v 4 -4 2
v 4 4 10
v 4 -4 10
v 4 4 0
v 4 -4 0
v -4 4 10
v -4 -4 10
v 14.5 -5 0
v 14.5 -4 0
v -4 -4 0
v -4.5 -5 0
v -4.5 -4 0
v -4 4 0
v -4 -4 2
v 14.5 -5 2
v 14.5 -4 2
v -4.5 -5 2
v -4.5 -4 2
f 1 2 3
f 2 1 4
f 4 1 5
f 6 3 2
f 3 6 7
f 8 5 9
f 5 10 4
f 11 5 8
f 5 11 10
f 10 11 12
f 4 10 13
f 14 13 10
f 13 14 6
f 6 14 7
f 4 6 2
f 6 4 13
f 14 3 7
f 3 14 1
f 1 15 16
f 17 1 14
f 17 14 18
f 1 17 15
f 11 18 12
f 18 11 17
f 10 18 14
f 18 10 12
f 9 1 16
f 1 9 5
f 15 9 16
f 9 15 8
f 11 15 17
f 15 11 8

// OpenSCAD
translate([0, 0, 5]) color([0,1,0,0.9]) cube([8, 8, 10], center=true);
translate([-4.25, -4.25, 1]) color([1,0,0]) cube([0.5, 0.5, 2], center=true);
translate([-3.75, -4.25, 1]) color([1,0,0]) cube([0.5, 0.5, 2], center=true);
translate([-3.25, -4.25, 1]) color([1,0,0]) cube([0.5, 0.5, 2], center=true);
translate([-2.75, -4.25, 1]) color([1,0,0]) cube([0.5, 0.5, 2], center=true);
translate([-2.25, -4.25, 1]) color([1,0,0]) cube([0.5, 0.5, 2], center=true);
translate([-1.75, -4.25, 1]) color([1,0,0]) cube([0.5, 0.5, 2], center=true);
translate([-1.25, -4.25, 1]) color([1,0,0]) cube([0.5, 0.5, 2], center=true);
translate([-0.75, -4.25, 1]) color([1,0,0]) cube([0.5, 0.5, 2], center=true);
translate([-0.25, -4.25, 1]) color([1,0,0]) cube([0.5, 0.5, 2], center=true);
translate([0.25, -4.25, 1]) color([1,0,0]) cube([0.5, 0.5, 2], center=true);
translate([0.75, -4.25, 1]) color([1,0,0]) cube([0.5, 0.5, 2], center=true);
translate([1.25, -4.25, 1]) color([1,0,0]) cube([0.5, 0.5, 2], center=true);
translate([1.75, -4.25, 1]) color([1,0,0]) cube([0.5, 0.5, 2], center=true);
translate([2.25, -4.25, 1]) color([1,0,0]) cube([0.5, 0.5, 2], center=true);
translate([2.75, -4.25, 1]) color([1,0,0]) cube([0.5, 0.5, 2], center=true);
translate([3.25, -4.25, 1]) color([1,0,0]) cube([0.5, 0.5, 2], center=true);
translate([3.75, -4.25, 1]) color([1,0,0]) cube([0.5, 0.5, 2], center=true);
translate([4.25, -4.25, 1]) color([1,0,0]) cube([0.5, 0.5, 2], center=true);
translate([4.75, -4.25, 1]) color([1,0,0]) cube([0.5, 0.5, 2], center=true);
translate([5.25, -4.25, 1]) color([1,0,0]) cube([0.5, 0.5, 2], center=true);
translate([5.75, -4.25, 1]) color([1,0,0]) cube([0.5, 0.5, 2], center=true);
translate([6.25, -4.25, 1]) color([1,0,0]) cube([0.5, 0.5, 2], center=true);
translate([6.75, -4.25, 1]) color([1,0,0]) cube([0.5, 0.5, 2], center=true);
translate([7.25, -4.25, 1]) color([1,0,0]) cube([0.5, 0.5, 2], center=true);
translate([7.75, -4.25, 1]) color([1,0,0]) cube([0.5, 0.5, 2], center=true);
translate([8.25, -4.25, 1]) color([1,0,0]) cube([0.5, 0.5, 2], center=true);
translate([8.75, -4.25, 1]) color([1,0,0]) cube([0.5, 0.5, 2], center=true);
translate([9.25, -4.25, 1]) color([1,0,0]) cube([0.5, 0.5, 2], center=true);
translate([9.75, -4.25, 1]) color([1,0,0]) cube([0.5, 0.5, 2], center=true);
translate([10.25, -4.25, 1]) color([1,0,0]) cube([0.5, 0.5, 2], center=true);
translate([10.75, -4.25, 1]) color([1,0,0]) cube([0.5, 0.5, 2], center=true);
translate([11.25, -4.25, 1]) color([1,0,0]) cube([0.5, 0.5, 2], center=true);
translate([11.75, -4.25, 1]) color([1,0,0]) cube([0.5, 0.5, 2], center=true);
translate([12.25, -4.25, 1]) color([1,0,0]) cube([0.5, 0.5, 2], center=true);
translate([12.75, -4.25, 1]) color([1,0,0]) cube([0.5, 0.5, 2], center=true);
translate([13.25, -4.25, 1]) color([1,0,0]) cube([0.5, 0.5, 2], center=true);
translate([13.75, -4.25, 1]) color([1,0,0]) cube([0.5, 0.5, 2], center=true);
translate([14.25, -4.25, 1]) color([1,0,0]) cube([0.5, 0.5, 2], center=true);
translate([-4.25, -4.75, 1]) color([1,0,0]) cube([0.5, 0.5, 2], center=true);
translate([-3.75, -4.75, 1]) color([1,0,0]) cube([0.5, 0.5, 2], center=true);
translate([-3.25, -4.75, 1]) color([1,0,0]) cube([0.5, 0.5, 2], center=true);
translate([-2.75, -4.75, 1]) color([1,0,0]) cube([0.5, 0.5, 2], center=true);
translate([-2.25, -4.75, 1]) color([1,0,0]) cube([0.5, 0.5, 2], center=true);
translate([-1.75, -4.75, 1]) color([1,0,0]) cube([0.5, 0.5, 2], center=true);
translate([-1.25, -4.75, 1]) color([1,0,0]) cube([0.5, 0.5, 2], center=true);
translate([-0.75, -4.75, 1]) color([1,0,0]) cube([0.5, 0.5, 2], center=true);
translate([-0.25, -4.75, 1]) color([1,0,0]) cube([0.5, 0.5, 2], center=true);
translate([0.25, -4.75, 1]) color([1,0,0]) cube([0.5, 0.5, 2], center=true);
translate([0.75, -4.75, 1]) color([1,0,0]) cube([0.5, 0.5, 2], center=true);
translate([1.25, -4.75, 1]) color([1,0,0]) cube([0.5, 0.5, 2], center=true);
translate([1.75, -4.75, 1]) color([1,0,0]) cube([0.5, 0.5, 2], center=true);
translate([2.25, -4.75, 1]) color([1,0,0]) cube([0.5, 0.5, 2], center=true);
translate([2.75, -4.75, 1]) color([1,0,0]) cube([0.5, 0.5, 2], center=true);
translate([3.25, -4.75, 1]) color([1,0,0]) cube([0.5, 0.5, 2], center=true);
translate([3.75, -4.75, 1]) color([1,0,0]) cube([0.5, 0.5, 2], center=true);
translate([4.25, -4.75, 1]) color([1,0,0]) cube([0.5, 0.5, 2], center=true);
translate([4.75, -4.75, 1]) color([1,0,0]) cube([0.5, 0.5, 2], center=true);
translate([5.25, -4.75, 1]) color([1,0,0]) cube([0.5, 0.5, 2], center=true);
translate([5.75, -4.75, 1]) color([1,0,0]) cube([0.5, 0.5, 2], center=true);
translate([6.25, -4.75, 1]) color([1,0,0]) cube([0.5, 0.5, 2], center=true);
translate([6.75, -4.75, 1]) color([1,0,0]) cube([0.5, 0.5, 2], center=true);
translate([7.25, -4.75, 1]) color([1,0,0]) cube([0.5, 0.5, 2], center=true);
translate([7.75, -4.75, 1]) color([1,0,0]) cube([0.5, 0.5, 2], center=true);
translate([8.25, -4.75, 1]) color([1,0,0]) cube([0.5, 0.5, 2], center=true);
translate([8.75, -4.75, 1]) color([1,0,0]) cube([0.5, 0.5, 2], center=true);
translate([9.25, -4.75, 1]) color([1,0,0]) cube([0.5, 0.5, 2], center=true);
translate([9.75, -4.75, 1]) color([1,0,0]) cube([0.5, 0.5, 2], center=true);
translate([10.25, -4.75, 1]) color([1,0,0]) cube([0.5, 0.5, 2], center=true);
translate([10.75, -4.75, 1]) color([1,0,0]) cube([0.5, 0.5, 2], center=true);
translate([11.25, -4.75, 1]) color([1,0,0]) cube([0.5, 0.5, 2], center=true);
translate([11.75, -4.75, 1]) color([1,0,0]) cube([0.5, 0.5, 2], center=true);
translate([12.25, -4.75, 1]) color([1,0,0]) cube([0.5, 0.5, 2], center=true);
translate([12.75, -4.75, 1]) color([1,0,0]) cube([0.5, 0.5, 2], center=true);
translate([13.25, -4.75, 1]) color([1,0,0]) cube([0.5, 0.5, 2], center=true);
translate([13.75, -4.75, 1]) color([1,0,0]) cube([0.5, 0.5, 2], center=true);
translate([14.25, -4.75, 1]) color([1,0,0]) cube([0.5, 0.5, 2], center=true);
